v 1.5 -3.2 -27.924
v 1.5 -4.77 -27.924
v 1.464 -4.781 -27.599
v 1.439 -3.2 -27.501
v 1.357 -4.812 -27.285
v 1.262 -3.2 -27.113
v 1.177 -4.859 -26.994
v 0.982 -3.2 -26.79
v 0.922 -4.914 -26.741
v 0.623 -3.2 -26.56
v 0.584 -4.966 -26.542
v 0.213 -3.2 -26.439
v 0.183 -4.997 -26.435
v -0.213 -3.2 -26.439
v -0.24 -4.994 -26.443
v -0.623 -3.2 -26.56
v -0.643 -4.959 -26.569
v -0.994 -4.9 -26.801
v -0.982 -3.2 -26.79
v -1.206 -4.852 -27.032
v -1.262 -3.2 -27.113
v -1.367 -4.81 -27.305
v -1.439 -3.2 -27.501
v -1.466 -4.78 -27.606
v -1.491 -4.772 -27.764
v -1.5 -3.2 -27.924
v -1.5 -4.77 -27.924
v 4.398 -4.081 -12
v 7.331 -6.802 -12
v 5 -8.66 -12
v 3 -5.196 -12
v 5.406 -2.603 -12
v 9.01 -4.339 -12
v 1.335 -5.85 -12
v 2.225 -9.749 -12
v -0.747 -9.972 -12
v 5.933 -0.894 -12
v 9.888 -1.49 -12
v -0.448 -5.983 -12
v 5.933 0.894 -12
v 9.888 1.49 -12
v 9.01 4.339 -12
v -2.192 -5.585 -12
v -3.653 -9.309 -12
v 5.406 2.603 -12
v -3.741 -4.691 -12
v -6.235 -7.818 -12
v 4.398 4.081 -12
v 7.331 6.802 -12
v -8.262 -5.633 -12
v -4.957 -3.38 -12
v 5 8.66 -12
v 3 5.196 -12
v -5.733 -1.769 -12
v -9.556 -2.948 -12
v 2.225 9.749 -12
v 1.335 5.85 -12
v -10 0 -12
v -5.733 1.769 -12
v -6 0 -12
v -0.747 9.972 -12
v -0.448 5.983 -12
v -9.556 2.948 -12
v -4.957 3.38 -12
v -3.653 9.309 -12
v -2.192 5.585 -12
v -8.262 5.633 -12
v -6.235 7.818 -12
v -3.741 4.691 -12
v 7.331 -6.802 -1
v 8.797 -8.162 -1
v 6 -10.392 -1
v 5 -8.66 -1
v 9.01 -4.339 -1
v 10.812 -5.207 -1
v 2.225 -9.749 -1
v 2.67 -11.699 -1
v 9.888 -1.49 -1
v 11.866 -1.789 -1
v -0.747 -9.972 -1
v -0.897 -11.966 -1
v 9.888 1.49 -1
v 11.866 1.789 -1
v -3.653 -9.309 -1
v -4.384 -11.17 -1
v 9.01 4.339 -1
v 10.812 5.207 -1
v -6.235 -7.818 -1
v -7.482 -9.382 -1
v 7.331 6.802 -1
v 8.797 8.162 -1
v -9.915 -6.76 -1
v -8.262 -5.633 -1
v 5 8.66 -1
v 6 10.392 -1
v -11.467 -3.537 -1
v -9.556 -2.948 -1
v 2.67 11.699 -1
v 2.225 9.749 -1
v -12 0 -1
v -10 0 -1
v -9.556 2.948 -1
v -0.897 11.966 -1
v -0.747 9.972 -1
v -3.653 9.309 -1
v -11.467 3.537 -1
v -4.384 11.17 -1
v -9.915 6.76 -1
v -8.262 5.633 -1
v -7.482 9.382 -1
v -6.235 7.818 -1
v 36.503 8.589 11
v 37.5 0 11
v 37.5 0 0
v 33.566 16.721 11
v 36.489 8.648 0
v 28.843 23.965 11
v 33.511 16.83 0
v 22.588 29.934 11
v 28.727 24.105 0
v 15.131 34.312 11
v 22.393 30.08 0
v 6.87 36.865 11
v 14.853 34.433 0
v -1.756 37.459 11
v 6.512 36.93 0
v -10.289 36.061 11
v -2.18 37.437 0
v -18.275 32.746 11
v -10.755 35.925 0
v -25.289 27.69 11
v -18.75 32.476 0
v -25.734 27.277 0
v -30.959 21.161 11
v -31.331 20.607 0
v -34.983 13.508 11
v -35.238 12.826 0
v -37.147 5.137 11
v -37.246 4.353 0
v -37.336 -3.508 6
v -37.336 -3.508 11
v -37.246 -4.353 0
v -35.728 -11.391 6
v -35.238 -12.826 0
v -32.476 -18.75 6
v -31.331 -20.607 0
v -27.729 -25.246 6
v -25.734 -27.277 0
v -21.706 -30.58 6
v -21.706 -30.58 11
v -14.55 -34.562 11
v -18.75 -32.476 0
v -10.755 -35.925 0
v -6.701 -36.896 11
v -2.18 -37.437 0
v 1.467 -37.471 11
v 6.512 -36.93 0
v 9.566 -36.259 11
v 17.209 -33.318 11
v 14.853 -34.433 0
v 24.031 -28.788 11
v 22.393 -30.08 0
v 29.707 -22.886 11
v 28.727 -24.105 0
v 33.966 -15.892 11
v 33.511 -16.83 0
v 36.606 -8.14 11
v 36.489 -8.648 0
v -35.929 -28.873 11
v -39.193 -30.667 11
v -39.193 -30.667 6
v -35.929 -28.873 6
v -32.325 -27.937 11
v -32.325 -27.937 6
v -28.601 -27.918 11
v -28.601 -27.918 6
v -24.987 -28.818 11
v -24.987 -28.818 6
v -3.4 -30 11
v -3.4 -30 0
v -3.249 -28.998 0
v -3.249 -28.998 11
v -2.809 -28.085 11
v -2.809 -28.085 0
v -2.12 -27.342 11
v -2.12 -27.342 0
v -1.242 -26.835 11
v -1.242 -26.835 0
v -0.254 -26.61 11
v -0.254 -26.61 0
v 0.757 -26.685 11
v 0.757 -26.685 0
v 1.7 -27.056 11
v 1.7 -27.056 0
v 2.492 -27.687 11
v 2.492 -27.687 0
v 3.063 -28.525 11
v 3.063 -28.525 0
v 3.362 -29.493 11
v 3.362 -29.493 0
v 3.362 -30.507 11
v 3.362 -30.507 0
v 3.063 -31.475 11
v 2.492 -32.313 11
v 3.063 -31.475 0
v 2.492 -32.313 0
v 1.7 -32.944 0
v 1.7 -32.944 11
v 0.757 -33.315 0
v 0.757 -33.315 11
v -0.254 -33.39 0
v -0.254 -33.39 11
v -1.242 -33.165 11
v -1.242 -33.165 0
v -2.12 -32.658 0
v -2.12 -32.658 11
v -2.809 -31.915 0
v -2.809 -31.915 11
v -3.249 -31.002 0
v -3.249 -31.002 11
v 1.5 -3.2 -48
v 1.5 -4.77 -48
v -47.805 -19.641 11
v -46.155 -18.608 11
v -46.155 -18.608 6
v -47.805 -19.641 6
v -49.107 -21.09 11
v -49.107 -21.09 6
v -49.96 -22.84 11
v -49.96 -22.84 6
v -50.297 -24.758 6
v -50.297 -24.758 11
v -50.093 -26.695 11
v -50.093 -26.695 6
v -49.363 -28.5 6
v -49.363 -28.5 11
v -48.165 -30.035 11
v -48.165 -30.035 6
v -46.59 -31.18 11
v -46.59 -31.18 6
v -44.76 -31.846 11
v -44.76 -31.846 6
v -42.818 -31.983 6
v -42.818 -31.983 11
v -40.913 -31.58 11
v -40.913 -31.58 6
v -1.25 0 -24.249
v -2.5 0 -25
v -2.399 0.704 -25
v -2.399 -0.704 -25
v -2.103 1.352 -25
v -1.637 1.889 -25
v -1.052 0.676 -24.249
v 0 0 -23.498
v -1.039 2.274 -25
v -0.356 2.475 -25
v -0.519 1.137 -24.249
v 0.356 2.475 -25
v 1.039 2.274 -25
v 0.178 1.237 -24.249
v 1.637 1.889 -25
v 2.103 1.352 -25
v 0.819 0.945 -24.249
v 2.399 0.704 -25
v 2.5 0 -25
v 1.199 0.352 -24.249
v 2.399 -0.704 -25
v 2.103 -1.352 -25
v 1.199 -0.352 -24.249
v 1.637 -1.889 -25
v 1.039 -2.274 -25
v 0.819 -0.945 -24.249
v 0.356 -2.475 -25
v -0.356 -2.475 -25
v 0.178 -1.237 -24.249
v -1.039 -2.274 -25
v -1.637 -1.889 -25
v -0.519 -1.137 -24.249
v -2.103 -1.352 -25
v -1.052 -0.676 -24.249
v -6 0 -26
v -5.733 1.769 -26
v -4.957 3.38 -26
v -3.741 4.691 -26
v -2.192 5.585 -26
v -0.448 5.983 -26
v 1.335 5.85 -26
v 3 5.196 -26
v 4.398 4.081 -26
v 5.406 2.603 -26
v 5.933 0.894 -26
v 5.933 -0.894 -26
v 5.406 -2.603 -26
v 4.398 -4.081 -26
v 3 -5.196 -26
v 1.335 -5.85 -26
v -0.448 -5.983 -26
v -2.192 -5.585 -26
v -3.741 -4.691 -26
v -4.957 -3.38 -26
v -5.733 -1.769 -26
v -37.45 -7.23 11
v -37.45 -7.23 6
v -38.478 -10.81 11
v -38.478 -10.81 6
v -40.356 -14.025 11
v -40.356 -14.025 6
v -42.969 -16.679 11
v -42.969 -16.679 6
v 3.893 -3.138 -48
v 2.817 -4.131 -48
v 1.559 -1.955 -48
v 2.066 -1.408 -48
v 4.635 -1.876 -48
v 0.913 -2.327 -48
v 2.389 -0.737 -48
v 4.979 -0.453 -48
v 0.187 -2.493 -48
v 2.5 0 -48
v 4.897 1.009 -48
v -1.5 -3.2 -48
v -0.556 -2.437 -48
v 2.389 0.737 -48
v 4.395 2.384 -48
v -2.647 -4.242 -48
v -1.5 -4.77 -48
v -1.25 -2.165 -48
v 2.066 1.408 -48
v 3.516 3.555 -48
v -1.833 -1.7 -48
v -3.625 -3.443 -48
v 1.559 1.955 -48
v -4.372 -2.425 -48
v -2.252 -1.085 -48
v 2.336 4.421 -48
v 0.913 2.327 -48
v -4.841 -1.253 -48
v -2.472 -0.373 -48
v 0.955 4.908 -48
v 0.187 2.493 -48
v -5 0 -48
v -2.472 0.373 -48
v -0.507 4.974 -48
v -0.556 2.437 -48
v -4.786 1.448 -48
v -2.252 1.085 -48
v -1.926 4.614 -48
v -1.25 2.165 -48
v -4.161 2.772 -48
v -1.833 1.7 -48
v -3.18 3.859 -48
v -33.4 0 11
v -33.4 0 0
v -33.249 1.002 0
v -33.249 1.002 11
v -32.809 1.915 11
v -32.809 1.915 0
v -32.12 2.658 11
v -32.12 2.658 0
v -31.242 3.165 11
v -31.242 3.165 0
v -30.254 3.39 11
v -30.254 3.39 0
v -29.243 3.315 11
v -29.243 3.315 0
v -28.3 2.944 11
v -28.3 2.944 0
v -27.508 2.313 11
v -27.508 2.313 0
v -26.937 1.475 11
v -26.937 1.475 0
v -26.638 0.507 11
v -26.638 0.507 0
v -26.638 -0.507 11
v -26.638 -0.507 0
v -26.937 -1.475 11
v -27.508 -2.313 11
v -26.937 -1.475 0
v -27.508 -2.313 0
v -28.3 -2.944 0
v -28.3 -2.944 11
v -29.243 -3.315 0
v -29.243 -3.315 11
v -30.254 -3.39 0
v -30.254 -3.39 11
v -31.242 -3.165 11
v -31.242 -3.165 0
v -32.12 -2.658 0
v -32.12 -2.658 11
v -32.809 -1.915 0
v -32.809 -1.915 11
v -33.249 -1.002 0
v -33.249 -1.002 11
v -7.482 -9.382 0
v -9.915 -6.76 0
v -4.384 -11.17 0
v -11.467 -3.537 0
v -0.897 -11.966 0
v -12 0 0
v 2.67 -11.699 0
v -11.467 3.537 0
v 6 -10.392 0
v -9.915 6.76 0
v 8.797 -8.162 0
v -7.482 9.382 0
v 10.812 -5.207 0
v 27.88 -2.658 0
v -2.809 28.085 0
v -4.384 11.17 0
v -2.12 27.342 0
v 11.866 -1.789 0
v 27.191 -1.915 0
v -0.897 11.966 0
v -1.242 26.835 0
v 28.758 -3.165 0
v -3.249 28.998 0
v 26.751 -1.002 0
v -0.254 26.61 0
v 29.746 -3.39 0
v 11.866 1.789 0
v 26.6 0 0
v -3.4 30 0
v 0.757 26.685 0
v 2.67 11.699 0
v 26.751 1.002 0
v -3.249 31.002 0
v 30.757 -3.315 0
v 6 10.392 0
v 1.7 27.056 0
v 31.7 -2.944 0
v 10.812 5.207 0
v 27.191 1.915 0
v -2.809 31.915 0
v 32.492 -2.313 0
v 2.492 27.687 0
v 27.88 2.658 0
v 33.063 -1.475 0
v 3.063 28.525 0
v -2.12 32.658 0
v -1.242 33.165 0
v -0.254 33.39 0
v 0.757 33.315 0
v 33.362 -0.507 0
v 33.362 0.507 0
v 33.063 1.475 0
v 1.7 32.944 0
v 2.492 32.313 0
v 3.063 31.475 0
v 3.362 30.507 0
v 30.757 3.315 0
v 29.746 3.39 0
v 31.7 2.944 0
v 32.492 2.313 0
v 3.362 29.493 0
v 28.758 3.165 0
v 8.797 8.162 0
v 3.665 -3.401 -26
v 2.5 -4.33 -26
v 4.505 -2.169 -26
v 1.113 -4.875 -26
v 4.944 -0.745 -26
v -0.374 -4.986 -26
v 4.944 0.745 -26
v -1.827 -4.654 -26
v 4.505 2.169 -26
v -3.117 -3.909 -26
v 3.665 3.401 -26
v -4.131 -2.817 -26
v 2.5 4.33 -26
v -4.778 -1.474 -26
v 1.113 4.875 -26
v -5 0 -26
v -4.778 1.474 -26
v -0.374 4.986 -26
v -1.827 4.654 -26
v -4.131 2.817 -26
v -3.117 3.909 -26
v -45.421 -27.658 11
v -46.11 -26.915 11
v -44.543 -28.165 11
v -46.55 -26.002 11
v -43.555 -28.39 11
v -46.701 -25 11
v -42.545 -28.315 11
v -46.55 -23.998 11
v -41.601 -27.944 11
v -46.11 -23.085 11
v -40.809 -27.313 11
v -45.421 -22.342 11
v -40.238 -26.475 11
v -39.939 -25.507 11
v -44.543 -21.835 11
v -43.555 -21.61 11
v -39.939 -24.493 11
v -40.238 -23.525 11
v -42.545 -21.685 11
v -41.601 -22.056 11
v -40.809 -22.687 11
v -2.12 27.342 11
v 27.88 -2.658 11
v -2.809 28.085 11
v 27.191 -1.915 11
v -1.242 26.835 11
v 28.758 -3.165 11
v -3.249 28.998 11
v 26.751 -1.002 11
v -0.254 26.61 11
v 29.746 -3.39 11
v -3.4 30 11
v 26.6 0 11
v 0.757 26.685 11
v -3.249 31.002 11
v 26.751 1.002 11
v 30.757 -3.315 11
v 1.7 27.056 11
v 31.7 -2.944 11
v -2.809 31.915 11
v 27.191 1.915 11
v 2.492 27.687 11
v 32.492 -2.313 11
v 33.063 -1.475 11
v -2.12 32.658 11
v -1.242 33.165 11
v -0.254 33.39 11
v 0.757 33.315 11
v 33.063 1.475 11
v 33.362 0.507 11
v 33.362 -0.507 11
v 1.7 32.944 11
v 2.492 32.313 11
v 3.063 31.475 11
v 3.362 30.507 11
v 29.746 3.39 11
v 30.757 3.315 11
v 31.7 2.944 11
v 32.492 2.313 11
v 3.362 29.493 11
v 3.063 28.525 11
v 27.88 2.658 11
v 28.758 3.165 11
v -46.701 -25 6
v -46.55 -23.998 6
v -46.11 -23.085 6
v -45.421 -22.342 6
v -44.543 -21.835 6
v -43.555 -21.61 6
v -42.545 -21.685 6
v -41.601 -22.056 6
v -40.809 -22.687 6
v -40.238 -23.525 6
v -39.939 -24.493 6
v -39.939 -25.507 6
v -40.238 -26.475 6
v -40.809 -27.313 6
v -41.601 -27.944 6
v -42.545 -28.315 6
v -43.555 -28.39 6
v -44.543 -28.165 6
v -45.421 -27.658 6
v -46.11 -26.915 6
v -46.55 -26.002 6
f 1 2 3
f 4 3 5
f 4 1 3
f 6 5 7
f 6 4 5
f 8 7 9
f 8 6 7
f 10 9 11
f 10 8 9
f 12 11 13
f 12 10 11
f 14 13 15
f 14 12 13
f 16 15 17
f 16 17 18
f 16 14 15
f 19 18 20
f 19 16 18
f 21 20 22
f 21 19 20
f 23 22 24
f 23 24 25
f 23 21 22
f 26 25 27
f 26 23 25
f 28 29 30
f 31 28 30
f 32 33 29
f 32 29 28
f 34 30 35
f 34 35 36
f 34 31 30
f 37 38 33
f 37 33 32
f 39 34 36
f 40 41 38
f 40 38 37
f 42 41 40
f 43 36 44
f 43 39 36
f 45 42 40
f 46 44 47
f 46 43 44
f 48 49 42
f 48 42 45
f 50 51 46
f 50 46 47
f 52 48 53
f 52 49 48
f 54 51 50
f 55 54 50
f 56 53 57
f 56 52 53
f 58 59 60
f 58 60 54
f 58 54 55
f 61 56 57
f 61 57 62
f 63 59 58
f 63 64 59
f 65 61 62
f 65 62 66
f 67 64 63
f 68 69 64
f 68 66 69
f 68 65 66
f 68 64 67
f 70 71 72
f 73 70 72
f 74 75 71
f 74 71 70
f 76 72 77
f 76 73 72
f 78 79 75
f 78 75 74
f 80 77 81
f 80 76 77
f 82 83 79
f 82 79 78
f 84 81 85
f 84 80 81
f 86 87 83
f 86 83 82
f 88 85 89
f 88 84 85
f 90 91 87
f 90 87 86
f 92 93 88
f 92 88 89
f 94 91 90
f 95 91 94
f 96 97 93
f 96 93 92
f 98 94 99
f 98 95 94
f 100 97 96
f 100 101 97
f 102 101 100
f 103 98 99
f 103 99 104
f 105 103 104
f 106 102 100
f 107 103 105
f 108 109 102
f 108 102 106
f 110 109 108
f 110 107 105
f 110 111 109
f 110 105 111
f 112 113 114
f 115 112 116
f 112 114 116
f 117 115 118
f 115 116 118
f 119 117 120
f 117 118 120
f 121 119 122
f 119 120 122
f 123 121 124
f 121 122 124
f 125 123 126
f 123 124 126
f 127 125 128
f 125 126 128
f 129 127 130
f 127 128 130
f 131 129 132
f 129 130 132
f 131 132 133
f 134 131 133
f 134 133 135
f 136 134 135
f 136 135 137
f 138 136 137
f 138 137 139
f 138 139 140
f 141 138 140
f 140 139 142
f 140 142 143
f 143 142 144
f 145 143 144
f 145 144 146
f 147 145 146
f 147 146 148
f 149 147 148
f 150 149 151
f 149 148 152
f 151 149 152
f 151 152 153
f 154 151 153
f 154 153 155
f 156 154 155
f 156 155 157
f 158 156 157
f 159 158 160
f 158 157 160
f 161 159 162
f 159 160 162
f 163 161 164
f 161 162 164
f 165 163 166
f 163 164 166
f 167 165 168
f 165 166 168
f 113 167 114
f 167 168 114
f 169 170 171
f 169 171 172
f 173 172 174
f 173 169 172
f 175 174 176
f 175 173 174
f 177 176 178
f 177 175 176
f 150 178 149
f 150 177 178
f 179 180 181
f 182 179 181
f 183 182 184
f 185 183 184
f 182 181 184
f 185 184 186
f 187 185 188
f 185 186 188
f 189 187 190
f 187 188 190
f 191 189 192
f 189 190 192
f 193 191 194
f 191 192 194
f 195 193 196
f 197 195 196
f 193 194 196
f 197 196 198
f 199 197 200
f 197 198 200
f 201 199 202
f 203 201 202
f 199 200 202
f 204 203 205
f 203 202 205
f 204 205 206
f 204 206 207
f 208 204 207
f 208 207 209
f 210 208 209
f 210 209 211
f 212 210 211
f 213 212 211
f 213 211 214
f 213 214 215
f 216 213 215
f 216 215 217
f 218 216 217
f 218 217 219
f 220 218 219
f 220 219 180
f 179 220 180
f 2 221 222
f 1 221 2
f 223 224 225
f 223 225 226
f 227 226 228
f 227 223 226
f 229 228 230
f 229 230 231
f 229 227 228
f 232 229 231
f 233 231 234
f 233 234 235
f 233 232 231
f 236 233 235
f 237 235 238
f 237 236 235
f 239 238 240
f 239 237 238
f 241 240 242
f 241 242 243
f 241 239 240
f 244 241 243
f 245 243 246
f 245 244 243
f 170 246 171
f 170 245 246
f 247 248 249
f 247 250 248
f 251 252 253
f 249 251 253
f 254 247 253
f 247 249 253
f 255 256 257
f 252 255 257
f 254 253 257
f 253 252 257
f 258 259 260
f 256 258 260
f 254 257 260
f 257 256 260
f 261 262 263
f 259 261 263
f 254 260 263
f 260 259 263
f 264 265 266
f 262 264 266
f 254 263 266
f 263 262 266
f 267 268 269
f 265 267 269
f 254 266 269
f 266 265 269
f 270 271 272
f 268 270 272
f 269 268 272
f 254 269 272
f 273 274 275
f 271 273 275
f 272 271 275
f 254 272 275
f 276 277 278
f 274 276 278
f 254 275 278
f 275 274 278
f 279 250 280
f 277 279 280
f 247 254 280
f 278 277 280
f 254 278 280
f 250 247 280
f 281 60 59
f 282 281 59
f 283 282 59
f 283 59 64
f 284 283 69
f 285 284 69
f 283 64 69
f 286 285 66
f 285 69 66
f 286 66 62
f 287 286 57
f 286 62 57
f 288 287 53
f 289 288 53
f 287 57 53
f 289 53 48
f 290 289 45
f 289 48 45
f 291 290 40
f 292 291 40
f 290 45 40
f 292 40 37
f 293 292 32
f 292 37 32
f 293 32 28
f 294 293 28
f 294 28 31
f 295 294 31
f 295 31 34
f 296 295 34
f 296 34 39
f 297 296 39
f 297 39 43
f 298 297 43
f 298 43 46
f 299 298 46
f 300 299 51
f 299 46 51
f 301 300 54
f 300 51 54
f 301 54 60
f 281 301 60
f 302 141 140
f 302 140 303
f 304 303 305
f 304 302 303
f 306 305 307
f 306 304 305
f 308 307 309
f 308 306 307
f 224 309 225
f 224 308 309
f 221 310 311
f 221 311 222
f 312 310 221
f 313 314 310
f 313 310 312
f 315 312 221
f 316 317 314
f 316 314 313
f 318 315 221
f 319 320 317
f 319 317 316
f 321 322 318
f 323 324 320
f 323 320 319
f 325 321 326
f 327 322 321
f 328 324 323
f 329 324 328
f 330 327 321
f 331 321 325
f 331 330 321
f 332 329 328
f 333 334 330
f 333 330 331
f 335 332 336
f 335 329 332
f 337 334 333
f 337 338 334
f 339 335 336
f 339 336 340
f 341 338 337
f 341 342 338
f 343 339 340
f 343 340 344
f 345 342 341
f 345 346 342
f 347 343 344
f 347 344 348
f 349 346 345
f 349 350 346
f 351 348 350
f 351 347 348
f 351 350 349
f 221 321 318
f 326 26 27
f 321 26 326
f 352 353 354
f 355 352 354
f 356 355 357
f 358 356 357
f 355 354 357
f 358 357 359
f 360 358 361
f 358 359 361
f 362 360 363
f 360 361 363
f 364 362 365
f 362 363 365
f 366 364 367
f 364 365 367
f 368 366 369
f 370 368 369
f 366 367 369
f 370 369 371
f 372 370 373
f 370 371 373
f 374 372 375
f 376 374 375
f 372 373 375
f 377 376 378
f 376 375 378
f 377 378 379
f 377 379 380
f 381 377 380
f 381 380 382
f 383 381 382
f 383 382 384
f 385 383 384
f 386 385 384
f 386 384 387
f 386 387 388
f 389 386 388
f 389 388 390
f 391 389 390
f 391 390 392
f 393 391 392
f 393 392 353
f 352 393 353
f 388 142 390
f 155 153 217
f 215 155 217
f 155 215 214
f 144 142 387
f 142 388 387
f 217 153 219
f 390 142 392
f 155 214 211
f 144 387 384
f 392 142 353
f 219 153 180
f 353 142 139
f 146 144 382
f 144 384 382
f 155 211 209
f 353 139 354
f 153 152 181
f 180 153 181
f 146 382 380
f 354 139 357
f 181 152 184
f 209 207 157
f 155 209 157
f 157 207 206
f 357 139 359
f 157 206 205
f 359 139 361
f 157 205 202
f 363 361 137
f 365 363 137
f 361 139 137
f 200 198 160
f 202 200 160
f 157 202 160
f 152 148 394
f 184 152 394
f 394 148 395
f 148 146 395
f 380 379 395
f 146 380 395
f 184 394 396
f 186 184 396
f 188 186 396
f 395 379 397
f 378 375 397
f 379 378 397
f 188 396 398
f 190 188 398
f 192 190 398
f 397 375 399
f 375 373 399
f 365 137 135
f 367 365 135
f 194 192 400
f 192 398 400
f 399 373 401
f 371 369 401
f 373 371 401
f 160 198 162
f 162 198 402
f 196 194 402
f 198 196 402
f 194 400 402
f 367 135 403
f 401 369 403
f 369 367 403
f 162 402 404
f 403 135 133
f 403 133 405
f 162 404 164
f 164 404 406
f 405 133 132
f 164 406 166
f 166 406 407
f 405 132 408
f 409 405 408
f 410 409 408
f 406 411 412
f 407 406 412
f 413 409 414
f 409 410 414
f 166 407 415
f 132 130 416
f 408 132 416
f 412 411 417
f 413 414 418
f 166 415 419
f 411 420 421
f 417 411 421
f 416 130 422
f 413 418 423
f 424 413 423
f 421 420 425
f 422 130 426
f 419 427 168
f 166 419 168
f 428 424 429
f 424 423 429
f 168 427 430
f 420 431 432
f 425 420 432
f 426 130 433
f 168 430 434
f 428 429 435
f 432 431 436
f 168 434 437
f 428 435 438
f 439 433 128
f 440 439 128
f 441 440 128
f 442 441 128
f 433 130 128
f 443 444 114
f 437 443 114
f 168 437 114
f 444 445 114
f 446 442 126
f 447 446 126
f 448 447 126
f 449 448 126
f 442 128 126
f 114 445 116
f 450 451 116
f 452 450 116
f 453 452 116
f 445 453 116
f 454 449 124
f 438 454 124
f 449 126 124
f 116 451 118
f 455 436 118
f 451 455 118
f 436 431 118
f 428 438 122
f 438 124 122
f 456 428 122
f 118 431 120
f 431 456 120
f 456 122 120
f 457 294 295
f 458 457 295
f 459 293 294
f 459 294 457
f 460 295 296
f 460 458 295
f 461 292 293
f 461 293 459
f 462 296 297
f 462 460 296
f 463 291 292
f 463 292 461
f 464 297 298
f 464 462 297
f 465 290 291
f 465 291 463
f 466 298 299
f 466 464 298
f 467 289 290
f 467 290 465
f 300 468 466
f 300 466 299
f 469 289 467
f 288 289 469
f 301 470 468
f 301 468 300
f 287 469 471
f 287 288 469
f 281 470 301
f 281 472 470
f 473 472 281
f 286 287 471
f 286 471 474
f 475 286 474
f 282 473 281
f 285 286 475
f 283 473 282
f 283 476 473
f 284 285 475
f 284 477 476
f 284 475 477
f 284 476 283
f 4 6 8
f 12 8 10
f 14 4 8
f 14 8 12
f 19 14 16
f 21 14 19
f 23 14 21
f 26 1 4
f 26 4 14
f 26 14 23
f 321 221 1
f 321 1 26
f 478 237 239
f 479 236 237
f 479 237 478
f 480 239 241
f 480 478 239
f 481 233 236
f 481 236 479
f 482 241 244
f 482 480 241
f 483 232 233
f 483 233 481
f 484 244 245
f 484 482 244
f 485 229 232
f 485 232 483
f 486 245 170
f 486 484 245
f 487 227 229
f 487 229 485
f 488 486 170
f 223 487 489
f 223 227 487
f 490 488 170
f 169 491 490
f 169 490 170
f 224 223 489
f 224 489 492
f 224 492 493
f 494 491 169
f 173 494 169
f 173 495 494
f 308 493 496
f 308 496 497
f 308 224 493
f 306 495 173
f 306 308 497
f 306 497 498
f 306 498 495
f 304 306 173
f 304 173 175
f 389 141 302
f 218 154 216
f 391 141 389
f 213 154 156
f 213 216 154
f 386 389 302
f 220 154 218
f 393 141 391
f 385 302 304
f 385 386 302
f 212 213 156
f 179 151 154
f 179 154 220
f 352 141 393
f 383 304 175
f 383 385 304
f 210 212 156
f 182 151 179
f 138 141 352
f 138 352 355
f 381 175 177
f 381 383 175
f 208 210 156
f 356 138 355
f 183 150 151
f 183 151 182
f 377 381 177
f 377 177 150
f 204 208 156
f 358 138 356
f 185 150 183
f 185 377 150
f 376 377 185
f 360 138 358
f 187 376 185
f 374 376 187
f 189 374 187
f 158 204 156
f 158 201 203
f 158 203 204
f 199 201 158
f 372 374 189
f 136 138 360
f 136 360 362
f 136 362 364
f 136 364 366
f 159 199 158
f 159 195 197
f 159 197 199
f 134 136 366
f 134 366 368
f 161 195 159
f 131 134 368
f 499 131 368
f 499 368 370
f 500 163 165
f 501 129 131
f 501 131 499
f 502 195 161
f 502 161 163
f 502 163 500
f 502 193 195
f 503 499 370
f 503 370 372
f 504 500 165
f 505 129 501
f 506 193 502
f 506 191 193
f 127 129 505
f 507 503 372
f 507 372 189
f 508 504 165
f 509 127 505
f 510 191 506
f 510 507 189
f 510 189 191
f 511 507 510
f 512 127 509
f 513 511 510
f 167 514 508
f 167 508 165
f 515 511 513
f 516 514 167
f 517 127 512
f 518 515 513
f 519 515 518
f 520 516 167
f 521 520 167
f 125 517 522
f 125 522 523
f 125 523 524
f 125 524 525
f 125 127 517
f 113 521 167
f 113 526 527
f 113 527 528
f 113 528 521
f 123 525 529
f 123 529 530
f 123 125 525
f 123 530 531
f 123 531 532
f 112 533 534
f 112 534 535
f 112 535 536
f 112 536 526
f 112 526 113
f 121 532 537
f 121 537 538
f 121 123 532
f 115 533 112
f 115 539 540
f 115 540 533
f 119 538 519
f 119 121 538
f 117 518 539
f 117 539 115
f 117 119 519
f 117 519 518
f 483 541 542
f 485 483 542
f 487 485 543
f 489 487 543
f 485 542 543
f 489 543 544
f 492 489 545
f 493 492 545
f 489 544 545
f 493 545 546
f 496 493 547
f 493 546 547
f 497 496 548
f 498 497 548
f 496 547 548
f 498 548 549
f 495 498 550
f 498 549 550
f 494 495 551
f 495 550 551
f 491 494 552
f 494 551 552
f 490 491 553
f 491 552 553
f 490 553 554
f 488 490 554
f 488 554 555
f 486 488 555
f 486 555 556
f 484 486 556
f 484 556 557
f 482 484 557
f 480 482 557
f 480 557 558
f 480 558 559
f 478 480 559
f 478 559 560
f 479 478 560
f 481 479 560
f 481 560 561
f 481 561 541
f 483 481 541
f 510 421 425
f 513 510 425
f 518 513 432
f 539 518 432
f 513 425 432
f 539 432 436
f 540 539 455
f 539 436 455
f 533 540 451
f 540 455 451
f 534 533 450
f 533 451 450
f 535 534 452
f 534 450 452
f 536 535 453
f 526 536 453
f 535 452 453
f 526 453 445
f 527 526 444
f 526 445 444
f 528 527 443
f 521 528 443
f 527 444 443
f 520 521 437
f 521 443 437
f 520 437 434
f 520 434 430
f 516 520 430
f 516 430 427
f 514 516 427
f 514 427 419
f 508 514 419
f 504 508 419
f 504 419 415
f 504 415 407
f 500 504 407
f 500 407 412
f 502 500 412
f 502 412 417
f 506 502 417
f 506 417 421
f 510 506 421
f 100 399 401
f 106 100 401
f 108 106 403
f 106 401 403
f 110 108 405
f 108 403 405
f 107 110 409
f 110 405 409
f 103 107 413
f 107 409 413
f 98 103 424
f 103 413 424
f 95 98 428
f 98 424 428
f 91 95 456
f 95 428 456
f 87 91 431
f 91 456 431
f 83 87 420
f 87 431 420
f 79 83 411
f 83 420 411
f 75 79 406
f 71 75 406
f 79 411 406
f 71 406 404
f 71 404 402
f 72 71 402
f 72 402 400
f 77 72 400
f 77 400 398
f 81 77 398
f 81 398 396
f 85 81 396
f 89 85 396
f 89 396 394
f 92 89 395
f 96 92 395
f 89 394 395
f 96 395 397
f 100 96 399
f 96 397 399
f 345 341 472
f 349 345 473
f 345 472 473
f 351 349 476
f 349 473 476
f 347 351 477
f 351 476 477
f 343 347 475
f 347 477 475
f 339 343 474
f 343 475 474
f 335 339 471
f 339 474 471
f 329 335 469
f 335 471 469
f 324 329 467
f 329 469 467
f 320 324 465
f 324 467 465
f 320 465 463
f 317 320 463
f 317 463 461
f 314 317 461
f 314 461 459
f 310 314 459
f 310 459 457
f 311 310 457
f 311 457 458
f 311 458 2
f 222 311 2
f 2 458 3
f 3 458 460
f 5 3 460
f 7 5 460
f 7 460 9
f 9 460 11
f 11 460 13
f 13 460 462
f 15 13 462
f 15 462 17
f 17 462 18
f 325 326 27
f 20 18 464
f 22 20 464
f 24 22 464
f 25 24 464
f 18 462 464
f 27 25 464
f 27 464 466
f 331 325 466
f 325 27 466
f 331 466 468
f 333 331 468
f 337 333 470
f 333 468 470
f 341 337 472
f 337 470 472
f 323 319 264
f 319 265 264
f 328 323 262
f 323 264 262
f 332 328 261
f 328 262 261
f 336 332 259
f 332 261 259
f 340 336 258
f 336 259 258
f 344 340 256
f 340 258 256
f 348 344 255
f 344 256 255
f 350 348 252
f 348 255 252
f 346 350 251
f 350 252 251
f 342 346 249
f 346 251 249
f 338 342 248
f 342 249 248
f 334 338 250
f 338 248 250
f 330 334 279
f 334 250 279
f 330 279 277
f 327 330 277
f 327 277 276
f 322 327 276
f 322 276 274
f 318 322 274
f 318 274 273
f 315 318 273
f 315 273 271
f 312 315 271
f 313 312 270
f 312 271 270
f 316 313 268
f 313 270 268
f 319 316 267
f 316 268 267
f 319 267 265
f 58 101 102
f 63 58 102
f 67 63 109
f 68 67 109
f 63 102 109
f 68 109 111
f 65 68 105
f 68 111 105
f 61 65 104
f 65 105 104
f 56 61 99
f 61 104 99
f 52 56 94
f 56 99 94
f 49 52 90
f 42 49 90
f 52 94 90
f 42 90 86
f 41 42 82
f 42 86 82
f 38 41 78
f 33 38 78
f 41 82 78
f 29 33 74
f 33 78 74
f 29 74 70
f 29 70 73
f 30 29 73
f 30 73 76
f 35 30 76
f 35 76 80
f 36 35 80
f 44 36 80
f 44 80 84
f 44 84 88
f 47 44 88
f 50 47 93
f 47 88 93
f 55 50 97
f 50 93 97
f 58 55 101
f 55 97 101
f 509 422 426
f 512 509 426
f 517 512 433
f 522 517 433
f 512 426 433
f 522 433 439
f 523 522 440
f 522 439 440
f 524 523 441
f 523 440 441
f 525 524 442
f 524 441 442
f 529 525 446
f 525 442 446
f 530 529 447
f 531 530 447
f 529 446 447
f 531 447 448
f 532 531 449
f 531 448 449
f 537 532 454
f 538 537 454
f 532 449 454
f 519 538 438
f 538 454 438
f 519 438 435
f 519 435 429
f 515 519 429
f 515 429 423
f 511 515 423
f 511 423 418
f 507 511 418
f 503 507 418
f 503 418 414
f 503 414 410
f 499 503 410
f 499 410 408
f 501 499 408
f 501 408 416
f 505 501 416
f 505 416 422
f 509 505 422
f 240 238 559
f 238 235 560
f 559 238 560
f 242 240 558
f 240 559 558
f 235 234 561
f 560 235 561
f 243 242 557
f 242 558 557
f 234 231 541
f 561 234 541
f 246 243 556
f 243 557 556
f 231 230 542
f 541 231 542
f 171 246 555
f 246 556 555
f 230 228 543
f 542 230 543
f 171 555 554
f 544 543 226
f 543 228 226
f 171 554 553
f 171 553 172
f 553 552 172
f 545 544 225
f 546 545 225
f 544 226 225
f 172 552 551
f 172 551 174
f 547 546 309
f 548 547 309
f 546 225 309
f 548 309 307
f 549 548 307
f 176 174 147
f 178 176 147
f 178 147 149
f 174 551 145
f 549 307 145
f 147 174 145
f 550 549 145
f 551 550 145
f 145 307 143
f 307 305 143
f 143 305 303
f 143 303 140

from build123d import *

# Parameters (mm, degrees)
SKETCH1_R                                     = 37.5
BOSS_EXTRUDE1_DEPTH                           = 11
TAP_DRILL_FOR_M8_TAP1_D                       = 6.8
TAP_DRILL_FOR_M8_TAP1_DEPTH                   = 23
TAP_DRILL_FOR_M8_TAP1_TIP                     = 2.042926105
SKETCH6_R                                     = 12
BOSS_EXTRU_1_DEPTH                            = 1
SKETCH5_R                                     = 10
BOSS_EXTRU_2_DEPTH                            = 11
ESQUISSE1_R                                   = 6
BOSS_EXTRU_3_DEPTH                            = 14
ESQUISSE4_R                                   = 5
BOSS_EXTRU_4_DEPTH                            = 22
TROU_POUR_TARAUDAGE_POUR_TROU_TARAUD_M6_D     = 5
TROU_POUR_TARAUDAGE_POUR_TROU_TARAUD_M6_DEPTH = 23
TROU_POUR_TARAUDAGE_POUR_TROU_TARAUD_M6_TIP   = 1.502151548
ENL_V_START                                   = -3.2
ENL_V_MAT_EXTRU_1_DEPTH                       = 10
BOSS_EXTRU_5_DEPTH                            = 5
TROU_POUR_TARAUDAGE_POUR_TROU_TARAUD_M8_D     = 6.8
TROU_POUR_TARAUDAGE_POUR_TROU_TARAUD_M8_DEPTH = 8
TROU_POUR_TARAUDAGE_POUR_TROU_TARAUD_M8_TIP   = 2.042926105


with BuildPart() as part:
    # Sketch1 → Boss-Extrude1 (new body)
    with BuildSketch(Plane.XY):
        Circle(SKETCH1_R)
    extrude(amount=BOSS_EXTRUDE1_DEPTH)

    # Tap Drill for M8 Tap1
    with Locations(Plane.XY.offset(11)):
        with Locations((-30, 0), (0, 30), (30, 0), (0, -30)):
            Hole(TAP_DRILL_FOR_M8_TAP1_D / 2, depth=TAP_DRILL_FOR_M8_TAP1_DEPTH)
            with Locations((0, 0, -(TAP_DRILL_FOR_M8_TAP1_DEPTH + TAP_DRILL_FOR_M8_TAP1_TIP / 2))):  # 118° drill point
                Cone(0, TAP_DRILL_FOR_M8_TAP1_D / 2, TAP_DRILL_FOR_M8_TAP1_TIP, mode=Mode.SUBTRACT)

    # Sketch6 → Boss.-Extru.1 (add)
    with BuildSketch(Plane(origin=(0, 0, 0), x_dir=(-1, 0, 0), z_dir=(0, 0, -1))):
        Circle(SKETCH6_R)
    extrude(amount=BOSS_EXTRU_1_DEPTH)

    # Sketch5 → Boss.-Extru.2 (add)
    with BuildSketch(Plane(origin=(0, 0, -1), x_dir=(-1, 0, 0), z_dir=(0, 0, -1))):
        Circle(SKETCH5_R)
    extrude(amount=BOSS_EXTRU_2_DEPTH)

    # Esquisse1 → Boss.-Extru.3 (add)
    with BuildSketch(Plane(origin=(0, 0, -12), x_dir=(-1, 0, 0), z_dir=(0, 0, -1))):
        Circle(ESQUISSE1_R)
    extrude(amount=BOSS_EXTRU_3_DEPTH)

    # Esquisse4 → Boss.-Extru.4 (add)
    with BuildSketch(Plane(origin=(0, 0, -26), x_dir=(-1, 0, 0), z_dir=(0, 0, -1))):
        Circle(ESQUISSE4_R)
    extrude(amount=BOSS_EXTRU_4_DEPTH)

    # Trou pour taraudage pour trou taraudé M61
    with Locations(Plane(origin=(0, 0, -48), x_dir=(-1, 0, 0), z_dir=(0, 0, -1))):
        with Locations((0, 0)):
            Hole(TROU_POUR_TARAUDAGE_POUR_TROU_TARAUD_M6_D / 2, depth=TROU_POUR_TARAUDAGE_POUR_TROU_TARAUD_M6_DEPTH)
            with Locations((0, 0, -(TROU_POUR_TARAUDAGE_POUR_TROU_TARAUD_M6_DEPTH + TROU_POUR_TARAUDAGE_POUR_TROU_TARAUD_M6_TIP / 2))):  # 118° drill point
                Cone(0, TROU_POUR_TARAUDAGE_POUR_TROU_TARAUD_M6_D / 2, TROU_POUR_TARAUDAGE_POUR_TROU_TARAUD_M6_TIP, mode=Mode.SUBTRACT)

    # Esquisse5 → Enlèv. mat.-Extru.1 (cut)
    with BuildSketch(Plane(origin=(0, 0, 0), x_dir=(1, 0, 0), z_dir=(0, 1, 0)).offset(ENL_V_START)):
        with BuildLine():
            Line((-1.5, 27.923988696), (-1.5, 48))
            ThreePointArc((-1.5, 48), (0, 49.5), (1.5, 48))
            Line((1.5, 48), (1.5, 27.923988696))
            ThreePointArc((1.5, 27.923988696), (0, 26.423988696), (-1.5, 27.923988696))
        make_face()
    extrude(amount=-ENL_V_MAT_EXTRU_1_DEPTH, mode=Mode.SUBTRACT)

    # Esquisse6 → Boss.-Extru.5 (add)
    with BuildSketch(Plane.XY.offset(11)):
        with BuildLine():
            ThreePointArc((-46.154891817, -18.608064174), (-49.363448016, -28.5), (-39.192502198, -30.667276735))
            ThreePointArc((-39.192502198, -30.667276735), (-30.463205965, -27.811629704), (-21.705713829, -30.579600834))
            ThreePointArc((-21.705713829, -30.579600834), (-32.475952642, -18.75), (-37.335568074, -3.507899166))
            ThreePointArc((-37.335568074, -3.507899166), (-39.317180827, -12.476095394), (-46.154891817, -18.608064174))
        make_face()
    extrude(amount=-BOSS_EXTRU_5_DEPTH)

    # Trou pour taraudage pour trou taraudé M81
    with Locations(Plane.XY.offset(11)):
        with Locations((-43.301270189, -25)):
            Hole(TROU_POUR_TARAUDAGE_POUR_TROU_TARAUD_M8_D / 2, depth=TROU_POUR_TARAUDAGE_POUR_TROU_TARAUD_M8_DEPTH)
            with Locations((0, 0, -(TROU_POUR_TARAUDAGE_POUR_TROU_TARAUD_M8_DEPTH + TROU_POUR_TARAUDAGE_POUR_TROU_TARAUD_M8_TIP / 2))):  # 118° drill point
                Cone(0, TROU_POUR_TARAUDAGE_POUR_TROU_TARAUD_M8_D / 2, TROU_POUR_TARAUDAGE_POUR_TROU_TARAUD_M8_TIP, mode=Mode.SUBTRACT)


solid = part.part
